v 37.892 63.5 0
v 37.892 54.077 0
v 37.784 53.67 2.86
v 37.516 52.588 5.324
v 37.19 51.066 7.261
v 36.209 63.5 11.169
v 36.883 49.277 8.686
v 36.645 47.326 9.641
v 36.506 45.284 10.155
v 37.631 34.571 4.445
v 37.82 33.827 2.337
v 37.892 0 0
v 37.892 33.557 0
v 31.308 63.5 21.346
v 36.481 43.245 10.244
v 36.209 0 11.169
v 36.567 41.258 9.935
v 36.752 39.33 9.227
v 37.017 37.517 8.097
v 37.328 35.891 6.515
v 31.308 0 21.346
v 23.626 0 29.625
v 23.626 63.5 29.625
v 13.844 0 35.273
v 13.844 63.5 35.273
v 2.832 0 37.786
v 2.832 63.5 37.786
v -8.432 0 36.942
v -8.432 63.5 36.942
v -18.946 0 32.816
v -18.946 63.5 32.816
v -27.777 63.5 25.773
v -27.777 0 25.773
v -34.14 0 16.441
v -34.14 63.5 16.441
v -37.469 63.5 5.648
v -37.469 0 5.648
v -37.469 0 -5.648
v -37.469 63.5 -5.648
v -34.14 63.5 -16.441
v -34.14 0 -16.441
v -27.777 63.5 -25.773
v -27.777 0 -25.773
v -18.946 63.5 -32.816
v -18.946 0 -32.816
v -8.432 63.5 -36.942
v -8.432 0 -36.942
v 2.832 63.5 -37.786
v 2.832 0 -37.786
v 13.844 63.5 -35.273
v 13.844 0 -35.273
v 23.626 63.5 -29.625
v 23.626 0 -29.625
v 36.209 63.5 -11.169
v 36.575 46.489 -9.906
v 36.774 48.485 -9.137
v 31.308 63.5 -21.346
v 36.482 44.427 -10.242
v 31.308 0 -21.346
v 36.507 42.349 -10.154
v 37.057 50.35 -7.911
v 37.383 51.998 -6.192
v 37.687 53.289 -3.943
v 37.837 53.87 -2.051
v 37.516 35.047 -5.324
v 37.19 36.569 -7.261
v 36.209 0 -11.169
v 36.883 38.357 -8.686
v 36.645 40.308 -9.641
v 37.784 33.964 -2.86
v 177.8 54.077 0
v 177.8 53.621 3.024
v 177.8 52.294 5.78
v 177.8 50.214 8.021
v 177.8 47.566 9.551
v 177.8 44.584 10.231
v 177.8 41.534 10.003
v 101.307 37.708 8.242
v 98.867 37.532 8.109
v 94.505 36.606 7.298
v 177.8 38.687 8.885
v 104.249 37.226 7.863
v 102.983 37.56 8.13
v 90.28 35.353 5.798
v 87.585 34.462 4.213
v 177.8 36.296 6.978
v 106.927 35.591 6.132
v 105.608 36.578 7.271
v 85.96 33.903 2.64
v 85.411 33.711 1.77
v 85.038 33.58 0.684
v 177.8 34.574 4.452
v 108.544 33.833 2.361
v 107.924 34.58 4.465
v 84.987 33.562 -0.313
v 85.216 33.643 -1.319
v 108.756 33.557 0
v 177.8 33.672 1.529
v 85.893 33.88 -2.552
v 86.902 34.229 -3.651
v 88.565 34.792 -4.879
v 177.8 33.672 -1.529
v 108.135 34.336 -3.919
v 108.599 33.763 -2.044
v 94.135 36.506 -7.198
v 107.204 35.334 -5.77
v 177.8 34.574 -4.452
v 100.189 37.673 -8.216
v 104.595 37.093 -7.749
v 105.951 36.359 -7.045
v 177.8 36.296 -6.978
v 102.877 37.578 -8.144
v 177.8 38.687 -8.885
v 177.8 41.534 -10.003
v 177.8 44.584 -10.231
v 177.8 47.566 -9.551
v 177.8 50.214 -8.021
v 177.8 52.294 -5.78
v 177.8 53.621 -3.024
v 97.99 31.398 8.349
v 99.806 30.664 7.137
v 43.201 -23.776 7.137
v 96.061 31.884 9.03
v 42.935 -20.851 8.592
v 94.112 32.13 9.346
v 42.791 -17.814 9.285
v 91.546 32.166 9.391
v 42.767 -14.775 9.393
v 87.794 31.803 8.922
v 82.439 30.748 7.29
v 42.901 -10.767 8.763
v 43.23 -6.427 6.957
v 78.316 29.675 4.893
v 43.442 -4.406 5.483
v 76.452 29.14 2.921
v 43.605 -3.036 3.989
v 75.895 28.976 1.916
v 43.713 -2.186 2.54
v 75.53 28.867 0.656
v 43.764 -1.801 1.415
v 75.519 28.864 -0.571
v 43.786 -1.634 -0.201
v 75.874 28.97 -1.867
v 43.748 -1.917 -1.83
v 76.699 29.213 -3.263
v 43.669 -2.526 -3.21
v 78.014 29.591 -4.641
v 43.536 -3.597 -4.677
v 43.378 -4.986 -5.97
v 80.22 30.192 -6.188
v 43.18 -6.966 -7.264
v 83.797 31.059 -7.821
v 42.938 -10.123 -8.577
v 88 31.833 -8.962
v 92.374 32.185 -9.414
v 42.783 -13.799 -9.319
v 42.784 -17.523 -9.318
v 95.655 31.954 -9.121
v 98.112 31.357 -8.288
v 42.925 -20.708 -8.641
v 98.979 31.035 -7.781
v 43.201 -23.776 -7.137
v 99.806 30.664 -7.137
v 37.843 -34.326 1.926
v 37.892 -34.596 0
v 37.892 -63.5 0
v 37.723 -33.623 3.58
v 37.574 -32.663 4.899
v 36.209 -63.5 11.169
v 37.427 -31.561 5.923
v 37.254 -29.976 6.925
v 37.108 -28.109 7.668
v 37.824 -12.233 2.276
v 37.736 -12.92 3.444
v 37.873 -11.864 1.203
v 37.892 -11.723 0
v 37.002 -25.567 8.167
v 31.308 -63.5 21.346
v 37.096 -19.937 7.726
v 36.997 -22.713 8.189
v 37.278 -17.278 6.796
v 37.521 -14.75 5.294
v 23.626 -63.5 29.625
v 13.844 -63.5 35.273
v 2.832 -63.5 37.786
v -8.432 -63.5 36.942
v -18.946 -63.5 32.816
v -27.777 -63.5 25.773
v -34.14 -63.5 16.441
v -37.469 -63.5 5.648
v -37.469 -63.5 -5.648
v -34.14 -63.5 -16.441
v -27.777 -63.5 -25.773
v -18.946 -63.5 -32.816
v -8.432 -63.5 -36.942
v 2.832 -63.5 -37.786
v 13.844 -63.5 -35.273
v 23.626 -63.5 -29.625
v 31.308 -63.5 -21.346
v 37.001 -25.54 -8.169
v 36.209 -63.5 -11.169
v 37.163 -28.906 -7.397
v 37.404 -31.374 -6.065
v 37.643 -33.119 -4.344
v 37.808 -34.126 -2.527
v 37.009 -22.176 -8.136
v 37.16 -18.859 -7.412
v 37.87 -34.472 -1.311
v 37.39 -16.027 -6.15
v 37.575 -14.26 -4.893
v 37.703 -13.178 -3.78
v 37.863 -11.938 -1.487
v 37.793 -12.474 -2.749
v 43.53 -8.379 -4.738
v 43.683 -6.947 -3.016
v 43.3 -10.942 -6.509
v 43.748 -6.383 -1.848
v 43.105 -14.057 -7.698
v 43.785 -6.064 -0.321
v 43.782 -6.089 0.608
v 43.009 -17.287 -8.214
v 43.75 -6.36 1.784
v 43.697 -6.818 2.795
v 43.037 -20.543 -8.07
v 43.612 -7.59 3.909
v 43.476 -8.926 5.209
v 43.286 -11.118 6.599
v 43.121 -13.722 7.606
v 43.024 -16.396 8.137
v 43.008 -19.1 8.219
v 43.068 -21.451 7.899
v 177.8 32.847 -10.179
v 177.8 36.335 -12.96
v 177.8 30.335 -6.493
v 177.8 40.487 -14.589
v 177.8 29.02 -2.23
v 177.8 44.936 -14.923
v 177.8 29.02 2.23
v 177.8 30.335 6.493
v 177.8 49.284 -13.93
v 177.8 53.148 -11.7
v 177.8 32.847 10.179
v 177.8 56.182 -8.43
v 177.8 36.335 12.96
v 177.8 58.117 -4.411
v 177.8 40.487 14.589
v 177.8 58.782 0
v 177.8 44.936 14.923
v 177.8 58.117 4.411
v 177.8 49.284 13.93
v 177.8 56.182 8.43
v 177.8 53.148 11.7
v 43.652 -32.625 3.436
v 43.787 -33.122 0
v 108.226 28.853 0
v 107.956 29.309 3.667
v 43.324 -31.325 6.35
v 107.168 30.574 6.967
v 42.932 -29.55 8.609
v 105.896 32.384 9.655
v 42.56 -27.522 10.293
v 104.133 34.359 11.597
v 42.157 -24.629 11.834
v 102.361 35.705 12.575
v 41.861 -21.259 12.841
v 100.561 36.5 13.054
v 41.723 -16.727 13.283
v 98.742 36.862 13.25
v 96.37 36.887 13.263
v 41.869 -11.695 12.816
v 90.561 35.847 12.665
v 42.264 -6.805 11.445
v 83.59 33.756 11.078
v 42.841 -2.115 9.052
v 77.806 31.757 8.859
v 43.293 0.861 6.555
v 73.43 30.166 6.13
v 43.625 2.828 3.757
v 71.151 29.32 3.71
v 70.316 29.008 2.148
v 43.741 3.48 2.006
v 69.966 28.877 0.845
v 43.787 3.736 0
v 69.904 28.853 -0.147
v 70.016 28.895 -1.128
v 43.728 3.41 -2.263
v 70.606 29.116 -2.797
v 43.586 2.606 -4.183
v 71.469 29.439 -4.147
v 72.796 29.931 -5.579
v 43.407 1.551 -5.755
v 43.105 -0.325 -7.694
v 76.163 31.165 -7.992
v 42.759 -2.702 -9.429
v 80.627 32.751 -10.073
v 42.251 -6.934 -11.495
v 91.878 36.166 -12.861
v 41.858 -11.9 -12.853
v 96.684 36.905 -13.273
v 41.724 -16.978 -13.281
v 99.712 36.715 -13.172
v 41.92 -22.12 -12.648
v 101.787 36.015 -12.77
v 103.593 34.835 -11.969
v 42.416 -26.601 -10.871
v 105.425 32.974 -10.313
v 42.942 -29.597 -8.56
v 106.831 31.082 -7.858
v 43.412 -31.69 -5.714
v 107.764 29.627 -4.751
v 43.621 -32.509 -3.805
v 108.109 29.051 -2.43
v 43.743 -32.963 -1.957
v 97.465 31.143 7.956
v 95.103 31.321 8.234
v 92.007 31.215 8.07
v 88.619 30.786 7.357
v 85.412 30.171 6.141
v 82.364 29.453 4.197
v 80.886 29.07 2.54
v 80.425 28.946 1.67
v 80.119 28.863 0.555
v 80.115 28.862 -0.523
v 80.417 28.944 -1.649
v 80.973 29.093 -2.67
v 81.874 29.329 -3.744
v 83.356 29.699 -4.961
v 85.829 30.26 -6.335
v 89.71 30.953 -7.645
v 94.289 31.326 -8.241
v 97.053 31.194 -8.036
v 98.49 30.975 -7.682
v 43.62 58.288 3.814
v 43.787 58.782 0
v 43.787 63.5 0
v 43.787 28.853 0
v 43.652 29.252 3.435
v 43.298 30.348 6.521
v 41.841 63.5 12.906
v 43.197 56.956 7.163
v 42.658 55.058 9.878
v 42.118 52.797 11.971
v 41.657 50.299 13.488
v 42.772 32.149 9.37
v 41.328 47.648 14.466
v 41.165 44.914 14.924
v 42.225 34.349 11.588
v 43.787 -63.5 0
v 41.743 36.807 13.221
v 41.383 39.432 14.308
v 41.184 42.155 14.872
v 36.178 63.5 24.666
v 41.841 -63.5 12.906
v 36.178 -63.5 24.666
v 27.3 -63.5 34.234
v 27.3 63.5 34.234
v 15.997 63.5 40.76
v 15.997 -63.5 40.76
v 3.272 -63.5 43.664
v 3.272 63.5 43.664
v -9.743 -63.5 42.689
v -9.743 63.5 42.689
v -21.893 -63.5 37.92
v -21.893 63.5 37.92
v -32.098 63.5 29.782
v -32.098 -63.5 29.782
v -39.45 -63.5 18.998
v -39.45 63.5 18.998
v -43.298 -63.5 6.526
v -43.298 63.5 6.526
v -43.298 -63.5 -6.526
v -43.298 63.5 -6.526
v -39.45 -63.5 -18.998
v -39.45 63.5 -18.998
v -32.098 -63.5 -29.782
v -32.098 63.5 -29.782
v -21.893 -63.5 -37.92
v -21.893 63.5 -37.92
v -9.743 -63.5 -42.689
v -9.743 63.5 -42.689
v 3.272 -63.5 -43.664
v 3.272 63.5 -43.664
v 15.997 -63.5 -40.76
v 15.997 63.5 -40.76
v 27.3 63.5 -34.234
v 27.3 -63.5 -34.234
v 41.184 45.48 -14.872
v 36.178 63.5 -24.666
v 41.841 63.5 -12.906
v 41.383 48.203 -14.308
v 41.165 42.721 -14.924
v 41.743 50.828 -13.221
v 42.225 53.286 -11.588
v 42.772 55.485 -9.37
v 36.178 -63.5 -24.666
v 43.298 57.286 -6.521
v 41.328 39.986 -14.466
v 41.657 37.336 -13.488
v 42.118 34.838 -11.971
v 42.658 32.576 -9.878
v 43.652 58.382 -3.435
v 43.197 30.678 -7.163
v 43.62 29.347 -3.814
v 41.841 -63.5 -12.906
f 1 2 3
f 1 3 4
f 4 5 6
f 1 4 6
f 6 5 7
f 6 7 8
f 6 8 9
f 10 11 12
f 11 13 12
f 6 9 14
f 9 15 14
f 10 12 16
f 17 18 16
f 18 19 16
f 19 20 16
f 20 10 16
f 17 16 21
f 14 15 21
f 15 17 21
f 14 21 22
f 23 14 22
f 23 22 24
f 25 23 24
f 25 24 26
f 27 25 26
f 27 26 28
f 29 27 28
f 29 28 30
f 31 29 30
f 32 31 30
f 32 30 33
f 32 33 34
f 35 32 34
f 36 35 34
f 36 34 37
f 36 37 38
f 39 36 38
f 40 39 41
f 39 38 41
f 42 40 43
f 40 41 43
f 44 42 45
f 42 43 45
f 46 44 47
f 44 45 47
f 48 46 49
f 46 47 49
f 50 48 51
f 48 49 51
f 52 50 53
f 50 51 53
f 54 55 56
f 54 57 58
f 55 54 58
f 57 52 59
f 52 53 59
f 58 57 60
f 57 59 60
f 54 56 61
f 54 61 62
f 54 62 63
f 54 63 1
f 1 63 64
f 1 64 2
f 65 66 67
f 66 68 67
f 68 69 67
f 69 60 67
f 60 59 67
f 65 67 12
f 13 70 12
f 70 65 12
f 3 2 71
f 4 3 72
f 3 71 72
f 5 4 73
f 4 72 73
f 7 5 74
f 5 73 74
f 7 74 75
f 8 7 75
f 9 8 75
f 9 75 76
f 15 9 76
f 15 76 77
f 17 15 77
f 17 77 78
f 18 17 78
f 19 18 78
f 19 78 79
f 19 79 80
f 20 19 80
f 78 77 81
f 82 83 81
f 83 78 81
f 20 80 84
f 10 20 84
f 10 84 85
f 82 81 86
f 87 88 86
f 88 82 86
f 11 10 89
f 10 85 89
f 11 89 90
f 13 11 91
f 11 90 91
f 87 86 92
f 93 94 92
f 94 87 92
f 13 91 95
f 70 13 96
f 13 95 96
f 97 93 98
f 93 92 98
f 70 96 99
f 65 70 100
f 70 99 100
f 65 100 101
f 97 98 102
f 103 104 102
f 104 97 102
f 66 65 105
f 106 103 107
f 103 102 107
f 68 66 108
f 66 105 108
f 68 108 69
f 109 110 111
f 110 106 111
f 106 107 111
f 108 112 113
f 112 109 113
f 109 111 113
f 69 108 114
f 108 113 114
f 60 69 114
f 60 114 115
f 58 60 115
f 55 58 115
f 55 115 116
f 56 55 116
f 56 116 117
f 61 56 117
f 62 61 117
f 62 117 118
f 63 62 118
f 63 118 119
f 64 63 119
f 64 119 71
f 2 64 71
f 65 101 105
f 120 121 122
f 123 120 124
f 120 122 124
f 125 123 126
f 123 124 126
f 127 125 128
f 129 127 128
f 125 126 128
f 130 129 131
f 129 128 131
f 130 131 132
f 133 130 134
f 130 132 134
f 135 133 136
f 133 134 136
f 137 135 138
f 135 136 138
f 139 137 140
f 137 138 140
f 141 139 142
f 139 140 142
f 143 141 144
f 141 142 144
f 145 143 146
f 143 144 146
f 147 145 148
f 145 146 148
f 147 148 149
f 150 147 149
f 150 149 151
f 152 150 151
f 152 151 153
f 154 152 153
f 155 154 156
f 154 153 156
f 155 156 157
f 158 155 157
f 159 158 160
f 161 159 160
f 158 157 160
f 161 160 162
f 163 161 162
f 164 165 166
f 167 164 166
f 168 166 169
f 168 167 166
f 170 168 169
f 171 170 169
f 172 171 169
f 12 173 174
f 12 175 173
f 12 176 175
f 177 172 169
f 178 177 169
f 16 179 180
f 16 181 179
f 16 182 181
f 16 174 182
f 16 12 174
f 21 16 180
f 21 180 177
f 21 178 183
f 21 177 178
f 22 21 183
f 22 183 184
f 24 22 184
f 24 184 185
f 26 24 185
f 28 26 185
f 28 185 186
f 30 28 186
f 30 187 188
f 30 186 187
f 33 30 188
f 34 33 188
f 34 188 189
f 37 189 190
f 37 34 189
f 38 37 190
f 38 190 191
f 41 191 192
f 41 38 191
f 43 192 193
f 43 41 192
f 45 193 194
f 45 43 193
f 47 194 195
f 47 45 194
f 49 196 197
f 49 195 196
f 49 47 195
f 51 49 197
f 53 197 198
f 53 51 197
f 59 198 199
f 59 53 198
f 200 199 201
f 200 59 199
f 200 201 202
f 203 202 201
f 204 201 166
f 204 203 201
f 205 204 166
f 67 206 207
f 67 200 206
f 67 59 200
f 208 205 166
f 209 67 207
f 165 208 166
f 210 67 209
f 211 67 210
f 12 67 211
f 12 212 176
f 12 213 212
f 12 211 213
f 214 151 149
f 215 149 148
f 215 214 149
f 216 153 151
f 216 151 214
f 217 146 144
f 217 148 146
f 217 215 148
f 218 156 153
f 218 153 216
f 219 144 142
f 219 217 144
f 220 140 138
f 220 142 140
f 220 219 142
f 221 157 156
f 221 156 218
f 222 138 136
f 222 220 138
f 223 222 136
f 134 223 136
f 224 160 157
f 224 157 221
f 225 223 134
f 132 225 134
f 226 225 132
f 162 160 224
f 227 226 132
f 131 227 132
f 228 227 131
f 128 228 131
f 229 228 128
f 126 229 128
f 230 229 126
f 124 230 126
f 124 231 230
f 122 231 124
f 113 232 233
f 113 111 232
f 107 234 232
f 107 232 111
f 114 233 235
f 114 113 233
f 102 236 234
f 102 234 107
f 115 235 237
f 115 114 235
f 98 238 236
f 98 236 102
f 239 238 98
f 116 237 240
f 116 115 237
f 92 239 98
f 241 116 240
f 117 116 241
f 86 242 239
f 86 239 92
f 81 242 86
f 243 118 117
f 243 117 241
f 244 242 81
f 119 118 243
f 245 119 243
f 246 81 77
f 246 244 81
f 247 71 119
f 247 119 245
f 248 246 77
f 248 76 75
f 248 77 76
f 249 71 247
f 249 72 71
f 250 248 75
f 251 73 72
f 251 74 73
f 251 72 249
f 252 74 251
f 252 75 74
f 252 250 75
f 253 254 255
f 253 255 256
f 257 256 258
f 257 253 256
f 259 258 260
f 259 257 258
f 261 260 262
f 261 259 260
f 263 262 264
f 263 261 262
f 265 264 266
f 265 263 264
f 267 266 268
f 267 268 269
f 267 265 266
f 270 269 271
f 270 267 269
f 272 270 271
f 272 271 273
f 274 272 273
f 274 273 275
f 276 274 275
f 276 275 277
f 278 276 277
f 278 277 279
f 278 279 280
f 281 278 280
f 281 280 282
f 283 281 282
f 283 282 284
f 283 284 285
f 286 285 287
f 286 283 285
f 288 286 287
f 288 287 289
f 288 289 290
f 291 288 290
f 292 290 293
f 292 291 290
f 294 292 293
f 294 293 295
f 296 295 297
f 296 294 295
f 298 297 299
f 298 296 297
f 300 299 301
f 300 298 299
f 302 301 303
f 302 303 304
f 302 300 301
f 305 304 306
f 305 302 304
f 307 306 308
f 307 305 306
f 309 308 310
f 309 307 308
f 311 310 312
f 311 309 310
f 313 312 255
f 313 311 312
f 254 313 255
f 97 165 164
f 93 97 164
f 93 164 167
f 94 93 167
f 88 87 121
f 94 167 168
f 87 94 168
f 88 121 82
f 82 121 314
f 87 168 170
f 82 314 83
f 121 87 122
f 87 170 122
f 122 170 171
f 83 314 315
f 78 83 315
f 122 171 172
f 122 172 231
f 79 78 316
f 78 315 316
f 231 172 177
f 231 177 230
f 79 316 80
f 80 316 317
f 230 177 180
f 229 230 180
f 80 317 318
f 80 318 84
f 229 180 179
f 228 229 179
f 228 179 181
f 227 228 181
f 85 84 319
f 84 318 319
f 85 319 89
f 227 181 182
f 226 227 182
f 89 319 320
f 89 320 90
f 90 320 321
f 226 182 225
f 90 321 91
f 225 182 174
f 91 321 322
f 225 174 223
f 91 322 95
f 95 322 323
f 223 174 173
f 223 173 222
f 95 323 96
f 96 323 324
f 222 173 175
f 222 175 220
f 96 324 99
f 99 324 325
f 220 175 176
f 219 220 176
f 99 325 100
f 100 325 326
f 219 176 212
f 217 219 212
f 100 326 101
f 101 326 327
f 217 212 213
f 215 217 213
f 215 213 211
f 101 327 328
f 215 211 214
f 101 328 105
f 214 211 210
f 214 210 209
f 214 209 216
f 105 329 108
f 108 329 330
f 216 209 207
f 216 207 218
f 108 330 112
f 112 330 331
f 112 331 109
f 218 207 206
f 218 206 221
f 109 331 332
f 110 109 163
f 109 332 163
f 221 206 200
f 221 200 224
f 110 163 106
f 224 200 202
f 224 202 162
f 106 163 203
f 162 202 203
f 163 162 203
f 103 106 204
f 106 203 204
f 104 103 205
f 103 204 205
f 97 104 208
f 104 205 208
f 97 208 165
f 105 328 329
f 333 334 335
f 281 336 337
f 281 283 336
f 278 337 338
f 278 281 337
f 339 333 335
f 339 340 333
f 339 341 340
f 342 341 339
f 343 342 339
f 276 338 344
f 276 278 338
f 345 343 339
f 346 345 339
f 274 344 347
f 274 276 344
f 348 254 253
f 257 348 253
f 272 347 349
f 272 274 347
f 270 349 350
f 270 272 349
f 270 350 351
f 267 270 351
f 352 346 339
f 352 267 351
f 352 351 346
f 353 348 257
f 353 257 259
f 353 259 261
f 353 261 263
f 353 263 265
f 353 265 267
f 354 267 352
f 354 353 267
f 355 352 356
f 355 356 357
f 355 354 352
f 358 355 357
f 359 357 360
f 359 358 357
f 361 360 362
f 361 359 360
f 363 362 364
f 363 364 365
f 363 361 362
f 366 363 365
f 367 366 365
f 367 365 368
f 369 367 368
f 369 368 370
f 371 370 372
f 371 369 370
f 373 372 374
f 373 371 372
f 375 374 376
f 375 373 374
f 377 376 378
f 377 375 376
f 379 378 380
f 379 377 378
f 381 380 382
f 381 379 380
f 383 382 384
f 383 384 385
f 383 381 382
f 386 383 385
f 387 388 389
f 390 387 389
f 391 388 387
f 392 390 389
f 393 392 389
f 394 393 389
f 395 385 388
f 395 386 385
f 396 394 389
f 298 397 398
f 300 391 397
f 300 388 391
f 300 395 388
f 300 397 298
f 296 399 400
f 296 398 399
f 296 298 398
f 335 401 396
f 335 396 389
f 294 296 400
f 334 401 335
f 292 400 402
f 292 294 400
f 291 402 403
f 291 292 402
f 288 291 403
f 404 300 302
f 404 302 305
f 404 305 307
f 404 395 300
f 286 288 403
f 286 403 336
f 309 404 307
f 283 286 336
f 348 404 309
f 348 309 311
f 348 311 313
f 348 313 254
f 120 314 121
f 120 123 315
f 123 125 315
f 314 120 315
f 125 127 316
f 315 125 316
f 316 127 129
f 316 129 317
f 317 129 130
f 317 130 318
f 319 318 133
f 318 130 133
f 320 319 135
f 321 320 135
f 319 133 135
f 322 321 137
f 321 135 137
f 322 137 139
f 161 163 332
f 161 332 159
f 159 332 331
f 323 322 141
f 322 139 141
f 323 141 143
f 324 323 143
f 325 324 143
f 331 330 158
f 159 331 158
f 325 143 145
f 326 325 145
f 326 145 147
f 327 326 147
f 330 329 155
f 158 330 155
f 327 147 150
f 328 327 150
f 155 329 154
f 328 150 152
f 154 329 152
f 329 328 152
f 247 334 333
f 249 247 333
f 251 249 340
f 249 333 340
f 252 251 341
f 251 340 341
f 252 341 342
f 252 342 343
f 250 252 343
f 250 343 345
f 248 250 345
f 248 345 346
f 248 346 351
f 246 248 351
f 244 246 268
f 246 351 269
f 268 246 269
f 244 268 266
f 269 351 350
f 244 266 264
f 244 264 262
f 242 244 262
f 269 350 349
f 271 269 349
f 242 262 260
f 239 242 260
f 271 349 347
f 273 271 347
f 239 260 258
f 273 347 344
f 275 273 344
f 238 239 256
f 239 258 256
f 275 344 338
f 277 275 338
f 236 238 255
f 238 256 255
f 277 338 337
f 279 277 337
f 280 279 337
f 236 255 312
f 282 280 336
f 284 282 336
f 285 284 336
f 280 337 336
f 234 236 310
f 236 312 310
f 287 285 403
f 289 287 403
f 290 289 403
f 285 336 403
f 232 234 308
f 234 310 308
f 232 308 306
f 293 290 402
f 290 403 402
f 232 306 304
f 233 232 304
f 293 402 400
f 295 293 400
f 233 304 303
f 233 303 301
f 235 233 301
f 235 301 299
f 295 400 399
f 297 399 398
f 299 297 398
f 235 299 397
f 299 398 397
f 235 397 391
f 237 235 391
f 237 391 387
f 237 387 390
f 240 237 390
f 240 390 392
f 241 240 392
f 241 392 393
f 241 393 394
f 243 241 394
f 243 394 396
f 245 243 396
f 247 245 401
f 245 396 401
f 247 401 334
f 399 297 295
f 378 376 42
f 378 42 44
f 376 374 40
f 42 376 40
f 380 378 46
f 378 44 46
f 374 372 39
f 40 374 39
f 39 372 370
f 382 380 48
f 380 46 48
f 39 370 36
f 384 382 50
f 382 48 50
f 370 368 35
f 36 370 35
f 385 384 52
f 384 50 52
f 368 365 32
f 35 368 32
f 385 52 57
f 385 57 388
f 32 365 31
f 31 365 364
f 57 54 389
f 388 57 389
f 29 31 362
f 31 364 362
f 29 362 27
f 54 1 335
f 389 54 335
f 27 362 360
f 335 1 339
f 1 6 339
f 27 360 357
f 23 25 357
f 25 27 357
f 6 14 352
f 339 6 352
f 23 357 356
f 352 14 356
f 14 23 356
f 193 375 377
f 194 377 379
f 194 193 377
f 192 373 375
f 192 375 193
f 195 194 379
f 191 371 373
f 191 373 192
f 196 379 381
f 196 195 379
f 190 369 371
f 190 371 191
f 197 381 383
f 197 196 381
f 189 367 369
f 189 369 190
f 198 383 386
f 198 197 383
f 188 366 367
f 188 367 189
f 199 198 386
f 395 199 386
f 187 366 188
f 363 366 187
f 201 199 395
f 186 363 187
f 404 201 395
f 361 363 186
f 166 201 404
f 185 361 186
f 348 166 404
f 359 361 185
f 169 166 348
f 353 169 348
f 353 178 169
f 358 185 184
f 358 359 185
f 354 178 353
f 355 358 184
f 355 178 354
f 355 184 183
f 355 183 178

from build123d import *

# Parameters (mm, degrees)
F0_R      = 43.786601
F1_DEPTH  = 63.5
F2_R      = 36.948177
F3_DEPTH  = 127.001
F4_R      = 14.964631
F5_DEPTH  = 177.8
F6_R      = 10.234569
F7_DEPTH  = 177.8
F8_DEPTH  = 127.001
F10_DEPTH = 21.80281
F11_R     = 13.282854
F11_R_2   = 9.414952
F12_DEPTH = 119.06572
F13_R     = 8.242853
F14_DEPTH = 126.54868
F15_R     = 37.892403
F16_DEPTH = 63.501
F17_R     = 10.259839
F18_DEPTH = 185.08291
F19_DEPTH = 161.75664


with BuildPart() as f1:
    # F0 (on Front) → F1 (new body, symmetric)
    with BuildSketch(Plane.XZ):
        Circle(F0_R)
    extrude(amount=F1_DEPTH, both=True)

    # F2 (on face) → F3 (cut, through all)
    with BuildSketch(Plane.XZ.offset(63.5)):
        Circle(F2_R)
    extrude(amount=-F3_DEPTH, mode=Mode.SUBTRACT)

    # F4 (on Right) → F5 (join)
    with BuildSketch(Plane.YZ):
        with Locations((43.817297, 0)):
            Circle(F4_R)
    extrude(amount=F5_DEPTH)

    # F6 (on face) → F7 (cut)
    with BuildSketch(Plane.YZ.offset(177.8)):
        with Locations((43.817297, 0)):
            Circle(F6_R)
    extrude(amount=-F7_DEPTH, mode=Mode.SUBTRACT)

    # F2 (on face) → F8 (cut, through all)
    with BuildSketch(Plane.XZ.offset(63.5)):
        Circle(F2_R)
    extrude(amount=-F8_DEPTH, mode=Mode.SUBTRACT)

    # F9 (on Top) → F10 (join, symmetric)
    with BuildSketch(Plane.XY):
        Polygon((37.235875, -51.78196), (4.975257, -18.238248), (-1.817873, -25.221262), (30.218051, -58.531342), align=None)
    extrude(amount=F10_DEPTH, both=True)

    # F11 (on face) → F12 (join)
    with BuildSketch(Plane(origin=(-13.545415, -13.027284, 0), x_dir=(0.693187, -0.720757, 0), z_dir=(-0.720757, -0.693187, 0))):
        with Locations((40.942468, 0)):
            Circle(F11_R)
        with Locations((40.942468, 0)):
            Circle(F11_R_2, mode=Mode.SUBTRACT)
    extrude(amount=-F12_DEPTH)

    # F13 (on face) → F14 (cut)
    with BuildSketch(Plane(origin=(-13.545415, -13.027284, 0), x_dir=(0.693187, -0.720757, 0), z_dir=(-0.720757, -0.693187, 0))):
        with Locations((42.958759, 0)):
            Circle(F13_R)
    extrude(amount=-F14_DEPTH, mode=Mode.SUBTRACT)

    # F15 (on Front) → F16 (cut, through all)
    with BuildSketch(Plane.XZ):
        Circle(F15_R)
    extrude(amount=F16_DEPTH, mode=Mode.SUBTRACT)

    # F17 (on face) → F18 (cut)
    with BuildSketch(Plane.YZ.offset(177.8)):
        with Locations((43.817297, 0)):
            Circle(F17_R)
    extrude(amount=-F18_DEPTH, mode=Mode.SUBTRACT)

    # F15 (on Front) → F19 (cut)
    with BuildSketch(Plane.XZ):
        Circle(F15_R)
    extrude(amount=-F19_DEPTH, mode=Mode.SUBTRACT)


solid = f1.part
